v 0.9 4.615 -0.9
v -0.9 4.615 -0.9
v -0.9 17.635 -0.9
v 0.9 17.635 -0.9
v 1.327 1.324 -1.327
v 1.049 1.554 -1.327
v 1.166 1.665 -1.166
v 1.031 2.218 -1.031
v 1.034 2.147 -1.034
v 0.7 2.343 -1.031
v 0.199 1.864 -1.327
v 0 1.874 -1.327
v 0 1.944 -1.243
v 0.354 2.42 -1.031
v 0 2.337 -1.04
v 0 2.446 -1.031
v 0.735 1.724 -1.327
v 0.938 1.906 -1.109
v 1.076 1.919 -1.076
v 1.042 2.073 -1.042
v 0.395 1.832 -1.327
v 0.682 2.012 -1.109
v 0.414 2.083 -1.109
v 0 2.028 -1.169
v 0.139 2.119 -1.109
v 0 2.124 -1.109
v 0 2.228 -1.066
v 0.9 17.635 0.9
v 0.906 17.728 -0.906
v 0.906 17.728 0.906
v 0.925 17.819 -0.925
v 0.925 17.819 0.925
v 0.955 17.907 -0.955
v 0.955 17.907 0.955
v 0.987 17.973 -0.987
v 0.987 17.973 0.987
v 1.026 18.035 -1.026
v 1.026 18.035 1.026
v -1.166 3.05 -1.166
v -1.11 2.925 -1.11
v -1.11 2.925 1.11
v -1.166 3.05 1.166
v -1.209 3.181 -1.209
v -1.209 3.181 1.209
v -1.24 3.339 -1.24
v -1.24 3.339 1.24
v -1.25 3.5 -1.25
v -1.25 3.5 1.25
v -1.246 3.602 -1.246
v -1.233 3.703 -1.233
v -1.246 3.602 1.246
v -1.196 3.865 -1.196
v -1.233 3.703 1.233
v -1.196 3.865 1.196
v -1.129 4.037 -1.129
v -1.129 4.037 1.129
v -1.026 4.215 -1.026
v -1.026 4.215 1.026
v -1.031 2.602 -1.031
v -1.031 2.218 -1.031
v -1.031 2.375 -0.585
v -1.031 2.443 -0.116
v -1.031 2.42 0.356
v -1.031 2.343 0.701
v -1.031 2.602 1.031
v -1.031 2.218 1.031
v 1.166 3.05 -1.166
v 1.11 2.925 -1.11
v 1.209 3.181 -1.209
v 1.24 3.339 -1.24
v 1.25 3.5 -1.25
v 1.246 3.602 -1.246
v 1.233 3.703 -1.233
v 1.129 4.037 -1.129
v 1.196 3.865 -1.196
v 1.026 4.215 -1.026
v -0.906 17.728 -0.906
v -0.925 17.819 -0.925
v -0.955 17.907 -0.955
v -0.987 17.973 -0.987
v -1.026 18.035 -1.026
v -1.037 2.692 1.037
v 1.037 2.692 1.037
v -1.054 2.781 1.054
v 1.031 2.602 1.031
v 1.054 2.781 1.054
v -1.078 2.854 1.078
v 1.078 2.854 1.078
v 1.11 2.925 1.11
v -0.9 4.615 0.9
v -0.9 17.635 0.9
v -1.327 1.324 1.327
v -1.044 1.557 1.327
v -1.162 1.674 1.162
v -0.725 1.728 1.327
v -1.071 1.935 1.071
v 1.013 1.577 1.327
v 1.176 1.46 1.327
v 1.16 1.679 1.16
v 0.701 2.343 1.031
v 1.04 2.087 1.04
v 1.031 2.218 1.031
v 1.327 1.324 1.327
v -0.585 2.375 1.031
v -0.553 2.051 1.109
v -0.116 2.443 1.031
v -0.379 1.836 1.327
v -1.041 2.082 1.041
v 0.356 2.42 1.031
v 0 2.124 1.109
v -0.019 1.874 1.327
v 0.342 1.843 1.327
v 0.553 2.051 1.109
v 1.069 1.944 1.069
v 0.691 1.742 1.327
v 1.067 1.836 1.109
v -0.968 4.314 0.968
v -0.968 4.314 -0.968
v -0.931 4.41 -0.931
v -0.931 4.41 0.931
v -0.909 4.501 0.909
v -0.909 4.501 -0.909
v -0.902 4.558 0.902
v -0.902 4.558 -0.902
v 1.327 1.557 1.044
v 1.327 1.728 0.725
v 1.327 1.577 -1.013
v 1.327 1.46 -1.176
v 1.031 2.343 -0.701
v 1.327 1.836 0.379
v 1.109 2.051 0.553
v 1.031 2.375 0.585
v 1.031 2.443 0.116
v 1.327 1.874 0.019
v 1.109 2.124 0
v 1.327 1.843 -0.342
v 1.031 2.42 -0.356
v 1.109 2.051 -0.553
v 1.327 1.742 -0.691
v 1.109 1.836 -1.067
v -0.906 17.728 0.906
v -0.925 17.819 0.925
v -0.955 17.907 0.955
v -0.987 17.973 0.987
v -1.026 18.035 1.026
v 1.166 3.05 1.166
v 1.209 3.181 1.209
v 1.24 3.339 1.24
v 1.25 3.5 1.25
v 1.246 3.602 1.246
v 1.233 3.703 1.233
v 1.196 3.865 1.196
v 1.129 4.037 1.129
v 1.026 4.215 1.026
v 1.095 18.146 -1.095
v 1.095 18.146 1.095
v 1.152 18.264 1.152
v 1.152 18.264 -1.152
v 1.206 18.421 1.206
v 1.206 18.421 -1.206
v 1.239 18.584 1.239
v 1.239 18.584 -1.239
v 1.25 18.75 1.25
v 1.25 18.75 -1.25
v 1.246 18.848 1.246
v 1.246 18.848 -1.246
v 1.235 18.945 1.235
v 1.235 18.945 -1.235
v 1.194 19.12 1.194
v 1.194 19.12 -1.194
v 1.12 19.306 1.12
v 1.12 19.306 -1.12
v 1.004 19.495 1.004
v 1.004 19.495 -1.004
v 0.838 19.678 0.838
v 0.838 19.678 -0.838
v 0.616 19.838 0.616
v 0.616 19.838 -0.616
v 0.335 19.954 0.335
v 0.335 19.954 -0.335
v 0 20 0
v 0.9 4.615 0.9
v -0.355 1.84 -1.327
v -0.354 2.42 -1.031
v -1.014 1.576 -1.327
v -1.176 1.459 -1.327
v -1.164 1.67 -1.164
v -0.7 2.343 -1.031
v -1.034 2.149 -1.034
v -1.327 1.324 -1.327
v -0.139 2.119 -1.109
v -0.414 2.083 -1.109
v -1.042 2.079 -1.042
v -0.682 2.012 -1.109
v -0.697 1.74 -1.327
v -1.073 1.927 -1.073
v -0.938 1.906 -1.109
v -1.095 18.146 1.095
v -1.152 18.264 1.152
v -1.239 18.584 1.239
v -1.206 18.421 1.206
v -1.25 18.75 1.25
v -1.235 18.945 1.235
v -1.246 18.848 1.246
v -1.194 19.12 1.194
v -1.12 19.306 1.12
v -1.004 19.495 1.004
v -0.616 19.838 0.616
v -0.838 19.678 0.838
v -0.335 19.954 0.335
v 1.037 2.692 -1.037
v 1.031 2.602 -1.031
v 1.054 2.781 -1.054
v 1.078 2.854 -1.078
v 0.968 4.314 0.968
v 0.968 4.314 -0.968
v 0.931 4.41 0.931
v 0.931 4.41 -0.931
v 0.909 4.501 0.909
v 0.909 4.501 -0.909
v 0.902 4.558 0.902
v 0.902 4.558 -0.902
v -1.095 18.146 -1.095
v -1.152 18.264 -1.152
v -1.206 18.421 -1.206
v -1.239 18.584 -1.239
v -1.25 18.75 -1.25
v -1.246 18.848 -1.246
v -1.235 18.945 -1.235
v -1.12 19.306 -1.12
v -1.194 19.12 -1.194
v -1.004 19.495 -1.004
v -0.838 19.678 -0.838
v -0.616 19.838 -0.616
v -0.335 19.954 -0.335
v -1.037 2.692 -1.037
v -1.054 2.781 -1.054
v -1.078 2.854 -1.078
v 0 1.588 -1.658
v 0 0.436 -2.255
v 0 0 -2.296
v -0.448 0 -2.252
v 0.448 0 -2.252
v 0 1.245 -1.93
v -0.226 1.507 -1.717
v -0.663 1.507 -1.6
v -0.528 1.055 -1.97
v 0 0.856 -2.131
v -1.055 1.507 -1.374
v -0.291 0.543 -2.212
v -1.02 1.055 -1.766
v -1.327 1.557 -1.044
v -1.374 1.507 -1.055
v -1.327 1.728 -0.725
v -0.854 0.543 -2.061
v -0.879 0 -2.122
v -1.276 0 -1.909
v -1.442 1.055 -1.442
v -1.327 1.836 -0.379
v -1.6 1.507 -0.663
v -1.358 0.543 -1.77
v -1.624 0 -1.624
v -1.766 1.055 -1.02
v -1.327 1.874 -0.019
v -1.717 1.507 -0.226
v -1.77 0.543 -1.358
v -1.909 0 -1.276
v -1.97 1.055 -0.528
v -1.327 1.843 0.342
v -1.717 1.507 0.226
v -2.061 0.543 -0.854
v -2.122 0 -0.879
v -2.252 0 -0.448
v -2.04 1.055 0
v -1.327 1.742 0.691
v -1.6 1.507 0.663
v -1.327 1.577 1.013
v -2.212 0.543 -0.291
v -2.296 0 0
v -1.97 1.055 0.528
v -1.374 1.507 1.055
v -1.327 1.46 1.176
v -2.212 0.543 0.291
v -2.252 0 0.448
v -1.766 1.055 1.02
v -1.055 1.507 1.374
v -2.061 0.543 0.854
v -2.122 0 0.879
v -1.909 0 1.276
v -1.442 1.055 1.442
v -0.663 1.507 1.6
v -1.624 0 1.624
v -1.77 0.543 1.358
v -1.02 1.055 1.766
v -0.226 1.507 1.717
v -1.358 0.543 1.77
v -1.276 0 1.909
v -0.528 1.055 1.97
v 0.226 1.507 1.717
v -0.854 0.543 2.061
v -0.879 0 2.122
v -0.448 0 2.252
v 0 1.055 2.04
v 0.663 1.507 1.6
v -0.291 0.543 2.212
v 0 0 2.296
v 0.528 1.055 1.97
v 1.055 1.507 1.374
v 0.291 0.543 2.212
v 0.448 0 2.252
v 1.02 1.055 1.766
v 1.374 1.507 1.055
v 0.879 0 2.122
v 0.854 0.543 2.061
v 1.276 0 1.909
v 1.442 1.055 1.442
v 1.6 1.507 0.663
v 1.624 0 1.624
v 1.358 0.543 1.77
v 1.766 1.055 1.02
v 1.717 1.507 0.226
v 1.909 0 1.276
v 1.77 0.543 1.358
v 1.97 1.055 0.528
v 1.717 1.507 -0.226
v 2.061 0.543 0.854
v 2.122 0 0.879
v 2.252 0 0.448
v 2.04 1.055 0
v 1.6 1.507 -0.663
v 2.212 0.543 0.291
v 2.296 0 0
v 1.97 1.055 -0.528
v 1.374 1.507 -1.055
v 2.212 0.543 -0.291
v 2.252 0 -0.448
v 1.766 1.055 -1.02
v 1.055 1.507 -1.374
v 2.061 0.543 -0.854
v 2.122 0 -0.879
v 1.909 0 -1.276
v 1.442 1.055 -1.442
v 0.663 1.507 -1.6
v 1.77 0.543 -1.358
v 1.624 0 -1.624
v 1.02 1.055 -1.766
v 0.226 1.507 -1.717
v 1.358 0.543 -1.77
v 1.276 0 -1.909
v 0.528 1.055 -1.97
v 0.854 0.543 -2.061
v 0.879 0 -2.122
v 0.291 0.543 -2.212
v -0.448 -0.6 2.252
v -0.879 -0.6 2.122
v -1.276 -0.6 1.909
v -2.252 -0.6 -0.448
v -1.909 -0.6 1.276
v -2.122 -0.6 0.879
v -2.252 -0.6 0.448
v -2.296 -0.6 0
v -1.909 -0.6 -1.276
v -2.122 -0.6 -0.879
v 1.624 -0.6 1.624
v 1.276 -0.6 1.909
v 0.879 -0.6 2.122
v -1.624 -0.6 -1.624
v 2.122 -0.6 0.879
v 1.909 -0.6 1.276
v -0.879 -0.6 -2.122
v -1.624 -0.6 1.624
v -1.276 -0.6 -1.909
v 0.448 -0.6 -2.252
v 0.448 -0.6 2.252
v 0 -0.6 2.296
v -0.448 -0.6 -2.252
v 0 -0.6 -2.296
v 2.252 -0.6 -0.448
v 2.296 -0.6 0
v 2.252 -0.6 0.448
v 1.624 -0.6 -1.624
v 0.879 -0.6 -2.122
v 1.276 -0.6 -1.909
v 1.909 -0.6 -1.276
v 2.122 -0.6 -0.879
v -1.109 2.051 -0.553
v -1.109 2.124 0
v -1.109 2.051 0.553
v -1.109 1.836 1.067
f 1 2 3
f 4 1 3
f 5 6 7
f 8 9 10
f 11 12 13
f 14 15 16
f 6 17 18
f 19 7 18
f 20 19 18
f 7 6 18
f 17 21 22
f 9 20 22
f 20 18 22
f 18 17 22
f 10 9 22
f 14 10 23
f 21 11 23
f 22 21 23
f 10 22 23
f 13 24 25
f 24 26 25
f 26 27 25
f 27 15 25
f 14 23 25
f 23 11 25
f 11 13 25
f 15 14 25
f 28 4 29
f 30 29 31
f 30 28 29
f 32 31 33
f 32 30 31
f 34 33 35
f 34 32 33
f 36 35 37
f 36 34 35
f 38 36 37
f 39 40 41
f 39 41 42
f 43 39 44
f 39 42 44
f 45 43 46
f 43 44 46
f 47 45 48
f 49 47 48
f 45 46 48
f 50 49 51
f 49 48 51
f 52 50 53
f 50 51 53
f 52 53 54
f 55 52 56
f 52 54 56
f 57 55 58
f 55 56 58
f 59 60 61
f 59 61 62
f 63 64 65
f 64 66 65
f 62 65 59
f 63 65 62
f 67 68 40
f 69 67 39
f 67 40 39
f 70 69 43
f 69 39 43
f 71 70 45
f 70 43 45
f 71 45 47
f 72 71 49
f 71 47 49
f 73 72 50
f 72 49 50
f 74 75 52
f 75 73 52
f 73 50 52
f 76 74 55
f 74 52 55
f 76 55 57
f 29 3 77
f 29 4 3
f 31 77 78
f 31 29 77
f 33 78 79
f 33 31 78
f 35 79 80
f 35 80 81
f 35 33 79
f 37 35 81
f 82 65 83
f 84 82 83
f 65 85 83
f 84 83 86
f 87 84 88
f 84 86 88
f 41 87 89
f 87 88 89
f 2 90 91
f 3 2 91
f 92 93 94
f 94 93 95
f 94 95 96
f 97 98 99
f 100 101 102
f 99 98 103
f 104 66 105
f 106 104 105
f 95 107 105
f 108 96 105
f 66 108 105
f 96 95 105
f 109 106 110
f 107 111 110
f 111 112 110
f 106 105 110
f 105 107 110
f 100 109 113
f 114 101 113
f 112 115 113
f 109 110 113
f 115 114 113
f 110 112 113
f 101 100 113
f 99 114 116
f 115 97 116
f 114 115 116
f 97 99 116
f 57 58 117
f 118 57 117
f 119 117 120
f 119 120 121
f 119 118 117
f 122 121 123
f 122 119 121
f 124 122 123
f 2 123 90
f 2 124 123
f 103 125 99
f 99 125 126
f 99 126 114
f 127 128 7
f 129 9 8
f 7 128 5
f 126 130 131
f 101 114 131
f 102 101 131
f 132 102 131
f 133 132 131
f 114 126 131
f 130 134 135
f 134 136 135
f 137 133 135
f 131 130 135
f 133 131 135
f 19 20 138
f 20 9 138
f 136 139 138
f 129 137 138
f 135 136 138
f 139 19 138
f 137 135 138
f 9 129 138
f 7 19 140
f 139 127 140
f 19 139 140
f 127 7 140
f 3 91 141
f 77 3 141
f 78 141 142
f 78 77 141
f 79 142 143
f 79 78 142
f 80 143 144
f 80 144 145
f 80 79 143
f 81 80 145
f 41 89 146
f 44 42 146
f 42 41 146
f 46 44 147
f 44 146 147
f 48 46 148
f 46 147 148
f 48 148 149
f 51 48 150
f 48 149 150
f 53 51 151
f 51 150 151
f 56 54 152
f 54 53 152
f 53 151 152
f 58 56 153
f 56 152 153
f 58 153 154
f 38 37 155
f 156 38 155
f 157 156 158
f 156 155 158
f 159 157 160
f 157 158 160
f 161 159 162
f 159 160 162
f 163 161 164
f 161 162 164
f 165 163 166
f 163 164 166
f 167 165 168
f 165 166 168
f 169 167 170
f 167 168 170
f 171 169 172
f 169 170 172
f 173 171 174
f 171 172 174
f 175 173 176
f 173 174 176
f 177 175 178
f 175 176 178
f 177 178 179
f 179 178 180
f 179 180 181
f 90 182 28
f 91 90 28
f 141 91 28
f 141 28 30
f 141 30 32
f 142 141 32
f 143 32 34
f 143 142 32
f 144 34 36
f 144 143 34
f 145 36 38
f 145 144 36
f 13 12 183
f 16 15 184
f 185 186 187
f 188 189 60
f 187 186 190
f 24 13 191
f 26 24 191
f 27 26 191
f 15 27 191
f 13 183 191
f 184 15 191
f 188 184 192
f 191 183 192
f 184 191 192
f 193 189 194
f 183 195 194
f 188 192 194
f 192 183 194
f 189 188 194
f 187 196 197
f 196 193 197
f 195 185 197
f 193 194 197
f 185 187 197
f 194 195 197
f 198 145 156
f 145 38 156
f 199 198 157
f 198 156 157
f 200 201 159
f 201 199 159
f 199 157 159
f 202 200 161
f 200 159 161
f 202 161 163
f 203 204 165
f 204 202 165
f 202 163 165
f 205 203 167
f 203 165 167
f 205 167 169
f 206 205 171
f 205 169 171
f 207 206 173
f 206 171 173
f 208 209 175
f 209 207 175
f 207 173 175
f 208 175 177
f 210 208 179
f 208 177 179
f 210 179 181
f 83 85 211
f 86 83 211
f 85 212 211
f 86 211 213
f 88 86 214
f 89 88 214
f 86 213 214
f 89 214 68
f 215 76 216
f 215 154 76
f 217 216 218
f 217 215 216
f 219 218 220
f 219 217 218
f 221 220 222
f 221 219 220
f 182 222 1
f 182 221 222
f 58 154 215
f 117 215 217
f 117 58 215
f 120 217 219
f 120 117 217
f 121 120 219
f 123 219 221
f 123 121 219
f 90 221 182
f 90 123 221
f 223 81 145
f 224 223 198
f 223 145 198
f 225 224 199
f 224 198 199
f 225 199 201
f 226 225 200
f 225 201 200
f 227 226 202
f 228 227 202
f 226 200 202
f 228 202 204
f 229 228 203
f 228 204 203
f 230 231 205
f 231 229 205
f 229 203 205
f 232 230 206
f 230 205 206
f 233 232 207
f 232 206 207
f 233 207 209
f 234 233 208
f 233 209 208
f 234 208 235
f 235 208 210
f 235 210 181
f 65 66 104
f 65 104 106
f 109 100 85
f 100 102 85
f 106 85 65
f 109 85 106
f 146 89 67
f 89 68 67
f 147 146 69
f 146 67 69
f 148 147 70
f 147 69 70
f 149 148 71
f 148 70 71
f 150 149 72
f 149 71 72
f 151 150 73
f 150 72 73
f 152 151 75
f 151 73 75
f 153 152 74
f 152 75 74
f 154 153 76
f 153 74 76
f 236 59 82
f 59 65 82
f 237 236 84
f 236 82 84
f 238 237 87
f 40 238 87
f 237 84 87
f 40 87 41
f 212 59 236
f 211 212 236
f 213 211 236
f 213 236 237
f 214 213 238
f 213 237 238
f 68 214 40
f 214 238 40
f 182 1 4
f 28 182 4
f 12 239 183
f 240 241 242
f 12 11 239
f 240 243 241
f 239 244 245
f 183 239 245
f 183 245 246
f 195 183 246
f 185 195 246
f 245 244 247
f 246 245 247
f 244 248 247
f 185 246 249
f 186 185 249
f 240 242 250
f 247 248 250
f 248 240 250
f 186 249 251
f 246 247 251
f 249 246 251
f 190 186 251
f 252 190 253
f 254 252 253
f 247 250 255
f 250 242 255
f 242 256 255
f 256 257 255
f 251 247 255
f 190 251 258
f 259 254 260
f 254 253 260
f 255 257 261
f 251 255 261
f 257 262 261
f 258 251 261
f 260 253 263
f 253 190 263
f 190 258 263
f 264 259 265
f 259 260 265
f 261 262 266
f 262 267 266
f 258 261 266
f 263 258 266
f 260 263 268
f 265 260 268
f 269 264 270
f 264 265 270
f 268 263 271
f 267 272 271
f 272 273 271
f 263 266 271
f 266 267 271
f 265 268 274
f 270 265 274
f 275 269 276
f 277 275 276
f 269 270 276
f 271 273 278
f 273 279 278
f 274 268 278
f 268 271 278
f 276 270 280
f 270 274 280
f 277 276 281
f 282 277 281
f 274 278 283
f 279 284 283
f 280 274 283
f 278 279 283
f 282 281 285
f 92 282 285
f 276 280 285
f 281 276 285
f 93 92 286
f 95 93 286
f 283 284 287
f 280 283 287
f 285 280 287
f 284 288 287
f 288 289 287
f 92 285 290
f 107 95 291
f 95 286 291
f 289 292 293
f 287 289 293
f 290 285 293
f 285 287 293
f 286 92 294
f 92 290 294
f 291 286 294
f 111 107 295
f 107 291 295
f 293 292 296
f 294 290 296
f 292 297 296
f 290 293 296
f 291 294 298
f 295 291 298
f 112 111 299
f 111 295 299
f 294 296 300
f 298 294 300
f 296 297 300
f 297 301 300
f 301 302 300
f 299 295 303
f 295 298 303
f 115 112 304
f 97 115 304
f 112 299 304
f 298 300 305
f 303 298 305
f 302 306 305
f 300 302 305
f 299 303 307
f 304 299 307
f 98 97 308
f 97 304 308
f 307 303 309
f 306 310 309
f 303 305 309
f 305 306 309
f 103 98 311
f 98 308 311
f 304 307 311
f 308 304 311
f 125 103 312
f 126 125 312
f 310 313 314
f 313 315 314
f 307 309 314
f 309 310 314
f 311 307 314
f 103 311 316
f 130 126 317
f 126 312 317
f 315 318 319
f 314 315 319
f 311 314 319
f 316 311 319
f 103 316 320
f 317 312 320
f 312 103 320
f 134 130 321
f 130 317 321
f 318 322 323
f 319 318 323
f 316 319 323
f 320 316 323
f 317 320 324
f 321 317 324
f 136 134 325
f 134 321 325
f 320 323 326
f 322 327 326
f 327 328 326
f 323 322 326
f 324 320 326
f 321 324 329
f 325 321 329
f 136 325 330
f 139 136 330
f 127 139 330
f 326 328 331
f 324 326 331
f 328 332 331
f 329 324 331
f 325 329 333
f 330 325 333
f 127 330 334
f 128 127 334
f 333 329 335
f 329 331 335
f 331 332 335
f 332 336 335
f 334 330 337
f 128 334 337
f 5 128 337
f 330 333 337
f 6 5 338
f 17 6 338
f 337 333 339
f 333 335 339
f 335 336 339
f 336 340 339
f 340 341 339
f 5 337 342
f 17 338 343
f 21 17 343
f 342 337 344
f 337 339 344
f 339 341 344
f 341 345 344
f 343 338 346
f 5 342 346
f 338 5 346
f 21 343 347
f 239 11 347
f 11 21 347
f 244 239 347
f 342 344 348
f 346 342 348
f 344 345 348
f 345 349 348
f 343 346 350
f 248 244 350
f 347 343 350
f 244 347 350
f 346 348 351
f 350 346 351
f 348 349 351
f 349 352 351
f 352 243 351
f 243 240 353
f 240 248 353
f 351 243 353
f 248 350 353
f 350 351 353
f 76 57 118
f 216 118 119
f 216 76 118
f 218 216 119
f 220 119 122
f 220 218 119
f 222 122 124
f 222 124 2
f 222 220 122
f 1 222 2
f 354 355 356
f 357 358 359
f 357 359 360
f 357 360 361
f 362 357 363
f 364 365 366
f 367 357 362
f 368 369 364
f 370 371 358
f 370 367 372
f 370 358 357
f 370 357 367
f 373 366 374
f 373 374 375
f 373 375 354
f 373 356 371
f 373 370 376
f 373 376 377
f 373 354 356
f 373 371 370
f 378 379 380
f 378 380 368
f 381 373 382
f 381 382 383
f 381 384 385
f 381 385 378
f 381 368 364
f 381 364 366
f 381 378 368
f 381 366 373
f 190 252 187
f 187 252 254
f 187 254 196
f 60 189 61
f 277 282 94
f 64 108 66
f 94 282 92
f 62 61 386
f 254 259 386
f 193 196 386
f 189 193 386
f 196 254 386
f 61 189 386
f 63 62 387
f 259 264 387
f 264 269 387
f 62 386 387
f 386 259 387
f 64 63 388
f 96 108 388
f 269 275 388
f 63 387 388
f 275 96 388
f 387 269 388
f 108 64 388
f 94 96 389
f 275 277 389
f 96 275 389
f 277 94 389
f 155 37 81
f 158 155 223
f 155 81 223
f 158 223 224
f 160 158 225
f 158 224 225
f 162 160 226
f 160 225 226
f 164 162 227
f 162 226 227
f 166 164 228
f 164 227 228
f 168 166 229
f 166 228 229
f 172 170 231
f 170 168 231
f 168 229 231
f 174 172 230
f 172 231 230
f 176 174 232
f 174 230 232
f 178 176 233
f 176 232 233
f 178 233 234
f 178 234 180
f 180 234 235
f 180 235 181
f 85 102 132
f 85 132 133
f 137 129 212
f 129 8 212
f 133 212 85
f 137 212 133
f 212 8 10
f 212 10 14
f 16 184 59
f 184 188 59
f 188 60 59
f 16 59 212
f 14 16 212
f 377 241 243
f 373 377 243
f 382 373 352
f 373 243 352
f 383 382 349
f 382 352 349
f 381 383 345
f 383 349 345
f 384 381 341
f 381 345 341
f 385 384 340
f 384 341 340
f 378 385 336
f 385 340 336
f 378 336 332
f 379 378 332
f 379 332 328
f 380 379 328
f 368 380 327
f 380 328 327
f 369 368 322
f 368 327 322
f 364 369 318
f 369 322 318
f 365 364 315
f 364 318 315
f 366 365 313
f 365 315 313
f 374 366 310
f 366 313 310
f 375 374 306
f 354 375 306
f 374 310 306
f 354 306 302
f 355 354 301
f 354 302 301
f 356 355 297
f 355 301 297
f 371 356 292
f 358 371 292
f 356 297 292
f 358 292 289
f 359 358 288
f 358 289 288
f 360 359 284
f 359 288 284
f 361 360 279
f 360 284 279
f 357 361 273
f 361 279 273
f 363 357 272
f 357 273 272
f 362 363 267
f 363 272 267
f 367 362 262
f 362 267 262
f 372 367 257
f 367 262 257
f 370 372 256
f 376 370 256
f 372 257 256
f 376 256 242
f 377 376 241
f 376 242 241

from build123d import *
from build123d.topology import SkipClean

# Parameters (mm, degrees)
SKETCH1_W           = 2.5
SKETCH1_H           = 2.5
BOSS_EXTRUDE1_DEPTH = 20
CUT_EXTRUDE1_DEPTH  = 21.077973005
CIRPATTERN1_COUNT   = 4
FILLET1_R           = 0.7
SKETCH6_R           = 2.29630994
BOSS_EXTRUDE2_DEPTH = 0.6


with BuildPart() as part:
    # Sketch1 → Boss-Extrude1 (new body)
    with BuildSketch(Plane(origin=(0, 0, 0), x_dir=(1, 0, 0), z_dir=(0, 1, 0))):
        Rectangle(SKETCH1_W, SKETCH1_H)
    extrude(amount=BOSS_EXTRUDE1_DEPTH)

    # Sketch3 → Cut-Extrude1 (cut, symmetric)
    with BuildSketch(Plane(origin=(0, 0, 0), x_dir=(0, 0, -1), z_dir=(1, 0, 0))):
        with BuildLine():
            Line((0, 20), (-2.286909141, 20))
            Line((-2.286909141, 20), (-2.286909141, 0))
            Line((-2.286909141, 0), (-1.031066268, 0))
            Line((-1.031066268, 0), (-1.031066268, 2.793315947))
            ThreePointArc((-1.031066268, 2.793315947), (-1.245689597, 3.603718018), (-0.9, 4.367467579))
            Line((-0.9, 4.367467579), (-0.9, 17.882532421))
            ThreePointArc((-0.9, 17.882532421), (-1.150398729, 19.238960902), (0, 20))
        make_face()
    cut_extrude1 = extrude(amount=CUT_EXTRUDE1_DEPTH, both=True, mode=Mode.SUBTRACT)

    # CirPattern1: Cut-Extrude1 ×4 about axis
    with SkipClean():  # the faces are left unmerged after this step: merging them gives an invalid solid
        cirpattern1_axis = Axis((0, 0, 0), (0, 1, 0))
        for i in range(1, CIRPATTERN1_COUNT):
            add(cut_extrude1.rotate(cirpattern1_axis, i * 360 / CIRPATTERN1_COUNT), mode=Mode.SUBTRACT)

    # Sketch2 → Revolve1 (revolve)
    with BuildSketch(Plane(origin=(0, 0, 0), x_dir=(0, 0, -1), z_dir=(1, 0, 0))):
        with BuildLine():
            Line((2.29630994, 0), (0, 0))
            Line((0, 0), (0, 2.29630994))
            ThreePointArc((0, 2.29630994), (1.623736331, 1.623736331), (2.29630994, 0))
        make_face()
    revolve(axis=Axis((0, 0, 0), (0, 1, 0)))

    # Fillet1
    fillet1_edges = [part.edges().sort_by_distance(p)[0] for p in [
        (0.9, 4.367467579, 0),
        (0, 4.367467579, -0.9),
        (-0.9, 4.367467579, 0),
        (0, 4.367467579, 0.9),
        (0, 17.882532421, -0.9),
        (-0.9, 17.882532421, 0),
        (0, 17.882532421, 0.9),
        (0.9, 17.882532421, 0),
        (-1.031066268, 2.793315947, 0),
        (0, 2.793315947, 1.031066268),
        (1.031066268, 2.793315947, 0),
        (0, 2.793315947, -1.031066268),
        (0.533927601, 1.981126702, -1.031066268),
        (-1.031066268, 2.051814244, 0),
        (0, 2.051814244, 1.031066268),
        (1.031066268, 2.051814244, 0),
    ]]
    fillet(fillet1_edges, radius=FILLET1_R)

    # Sketch6 → Boss-Extrude2 (add)
    with BuildSketch(Plane.XZ):
        with Locations(Location((0, 0, 0), (0, 0, 270))):
            Circle(SKETCH6_R)
    extrude(amount=BOSS_EXTRUDE2_DEPTH)


solid = part.part
